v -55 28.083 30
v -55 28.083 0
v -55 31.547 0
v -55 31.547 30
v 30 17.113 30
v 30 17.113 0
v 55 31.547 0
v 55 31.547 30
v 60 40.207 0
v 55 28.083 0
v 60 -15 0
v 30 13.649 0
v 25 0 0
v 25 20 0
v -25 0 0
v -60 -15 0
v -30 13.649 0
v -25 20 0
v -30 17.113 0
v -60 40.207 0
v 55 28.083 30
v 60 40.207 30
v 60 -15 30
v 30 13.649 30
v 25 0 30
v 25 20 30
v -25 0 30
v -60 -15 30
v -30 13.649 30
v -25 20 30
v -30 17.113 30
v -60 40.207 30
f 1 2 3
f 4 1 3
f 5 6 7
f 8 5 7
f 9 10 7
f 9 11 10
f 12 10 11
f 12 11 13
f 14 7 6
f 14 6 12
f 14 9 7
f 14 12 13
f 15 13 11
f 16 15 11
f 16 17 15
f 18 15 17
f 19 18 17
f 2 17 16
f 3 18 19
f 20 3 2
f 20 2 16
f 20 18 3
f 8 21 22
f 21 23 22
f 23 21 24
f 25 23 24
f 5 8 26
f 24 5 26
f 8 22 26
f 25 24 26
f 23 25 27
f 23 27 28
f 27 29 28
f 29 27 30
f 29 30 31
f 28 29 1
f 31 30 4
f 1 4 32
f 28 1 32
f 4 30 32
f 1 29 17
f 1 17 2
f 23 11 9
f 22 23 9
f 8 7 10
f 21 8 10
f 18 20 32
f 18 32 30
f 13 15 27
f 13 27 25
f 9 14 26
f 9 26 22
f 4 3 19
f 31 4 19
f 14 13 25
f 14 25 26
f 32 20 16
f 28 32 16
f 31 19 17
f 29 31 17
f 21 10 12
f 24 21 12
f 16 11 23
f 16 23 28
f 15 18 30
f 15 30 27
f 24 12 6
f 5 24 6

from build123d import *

# Parameters (mm, degrees)
BOSS_EXTRU_1_DEPTH = 30


with BuildPart() as part:
    # Esquisse1 → Boss.-Extru.1 (new body)
    with BuildSketch(Plane.XY):
        Polygon((25, 20), (60, 40.207259422), (60, 0), (60, -15), (-60, -15), (-60, 0), (-60, 40.207259422), (-25, 20), (-25, 0), (25, 0), align=None)
        Polygon((30, 17.113248654), (55, 31.547005384), (55, 28.082903769), (30, 13.649147039), align=None, mode=Mode.SUBTRACT)
        Polygon((-30, 17.113248654), (-30, 13.649147039), (-55, 28.082903769), (-55, 31.547005384), align=None, mode=Mode.SUBTRACT)
    extrude(amount=BOSS_EXTRU_1_DEPTH)


solid = part.part
